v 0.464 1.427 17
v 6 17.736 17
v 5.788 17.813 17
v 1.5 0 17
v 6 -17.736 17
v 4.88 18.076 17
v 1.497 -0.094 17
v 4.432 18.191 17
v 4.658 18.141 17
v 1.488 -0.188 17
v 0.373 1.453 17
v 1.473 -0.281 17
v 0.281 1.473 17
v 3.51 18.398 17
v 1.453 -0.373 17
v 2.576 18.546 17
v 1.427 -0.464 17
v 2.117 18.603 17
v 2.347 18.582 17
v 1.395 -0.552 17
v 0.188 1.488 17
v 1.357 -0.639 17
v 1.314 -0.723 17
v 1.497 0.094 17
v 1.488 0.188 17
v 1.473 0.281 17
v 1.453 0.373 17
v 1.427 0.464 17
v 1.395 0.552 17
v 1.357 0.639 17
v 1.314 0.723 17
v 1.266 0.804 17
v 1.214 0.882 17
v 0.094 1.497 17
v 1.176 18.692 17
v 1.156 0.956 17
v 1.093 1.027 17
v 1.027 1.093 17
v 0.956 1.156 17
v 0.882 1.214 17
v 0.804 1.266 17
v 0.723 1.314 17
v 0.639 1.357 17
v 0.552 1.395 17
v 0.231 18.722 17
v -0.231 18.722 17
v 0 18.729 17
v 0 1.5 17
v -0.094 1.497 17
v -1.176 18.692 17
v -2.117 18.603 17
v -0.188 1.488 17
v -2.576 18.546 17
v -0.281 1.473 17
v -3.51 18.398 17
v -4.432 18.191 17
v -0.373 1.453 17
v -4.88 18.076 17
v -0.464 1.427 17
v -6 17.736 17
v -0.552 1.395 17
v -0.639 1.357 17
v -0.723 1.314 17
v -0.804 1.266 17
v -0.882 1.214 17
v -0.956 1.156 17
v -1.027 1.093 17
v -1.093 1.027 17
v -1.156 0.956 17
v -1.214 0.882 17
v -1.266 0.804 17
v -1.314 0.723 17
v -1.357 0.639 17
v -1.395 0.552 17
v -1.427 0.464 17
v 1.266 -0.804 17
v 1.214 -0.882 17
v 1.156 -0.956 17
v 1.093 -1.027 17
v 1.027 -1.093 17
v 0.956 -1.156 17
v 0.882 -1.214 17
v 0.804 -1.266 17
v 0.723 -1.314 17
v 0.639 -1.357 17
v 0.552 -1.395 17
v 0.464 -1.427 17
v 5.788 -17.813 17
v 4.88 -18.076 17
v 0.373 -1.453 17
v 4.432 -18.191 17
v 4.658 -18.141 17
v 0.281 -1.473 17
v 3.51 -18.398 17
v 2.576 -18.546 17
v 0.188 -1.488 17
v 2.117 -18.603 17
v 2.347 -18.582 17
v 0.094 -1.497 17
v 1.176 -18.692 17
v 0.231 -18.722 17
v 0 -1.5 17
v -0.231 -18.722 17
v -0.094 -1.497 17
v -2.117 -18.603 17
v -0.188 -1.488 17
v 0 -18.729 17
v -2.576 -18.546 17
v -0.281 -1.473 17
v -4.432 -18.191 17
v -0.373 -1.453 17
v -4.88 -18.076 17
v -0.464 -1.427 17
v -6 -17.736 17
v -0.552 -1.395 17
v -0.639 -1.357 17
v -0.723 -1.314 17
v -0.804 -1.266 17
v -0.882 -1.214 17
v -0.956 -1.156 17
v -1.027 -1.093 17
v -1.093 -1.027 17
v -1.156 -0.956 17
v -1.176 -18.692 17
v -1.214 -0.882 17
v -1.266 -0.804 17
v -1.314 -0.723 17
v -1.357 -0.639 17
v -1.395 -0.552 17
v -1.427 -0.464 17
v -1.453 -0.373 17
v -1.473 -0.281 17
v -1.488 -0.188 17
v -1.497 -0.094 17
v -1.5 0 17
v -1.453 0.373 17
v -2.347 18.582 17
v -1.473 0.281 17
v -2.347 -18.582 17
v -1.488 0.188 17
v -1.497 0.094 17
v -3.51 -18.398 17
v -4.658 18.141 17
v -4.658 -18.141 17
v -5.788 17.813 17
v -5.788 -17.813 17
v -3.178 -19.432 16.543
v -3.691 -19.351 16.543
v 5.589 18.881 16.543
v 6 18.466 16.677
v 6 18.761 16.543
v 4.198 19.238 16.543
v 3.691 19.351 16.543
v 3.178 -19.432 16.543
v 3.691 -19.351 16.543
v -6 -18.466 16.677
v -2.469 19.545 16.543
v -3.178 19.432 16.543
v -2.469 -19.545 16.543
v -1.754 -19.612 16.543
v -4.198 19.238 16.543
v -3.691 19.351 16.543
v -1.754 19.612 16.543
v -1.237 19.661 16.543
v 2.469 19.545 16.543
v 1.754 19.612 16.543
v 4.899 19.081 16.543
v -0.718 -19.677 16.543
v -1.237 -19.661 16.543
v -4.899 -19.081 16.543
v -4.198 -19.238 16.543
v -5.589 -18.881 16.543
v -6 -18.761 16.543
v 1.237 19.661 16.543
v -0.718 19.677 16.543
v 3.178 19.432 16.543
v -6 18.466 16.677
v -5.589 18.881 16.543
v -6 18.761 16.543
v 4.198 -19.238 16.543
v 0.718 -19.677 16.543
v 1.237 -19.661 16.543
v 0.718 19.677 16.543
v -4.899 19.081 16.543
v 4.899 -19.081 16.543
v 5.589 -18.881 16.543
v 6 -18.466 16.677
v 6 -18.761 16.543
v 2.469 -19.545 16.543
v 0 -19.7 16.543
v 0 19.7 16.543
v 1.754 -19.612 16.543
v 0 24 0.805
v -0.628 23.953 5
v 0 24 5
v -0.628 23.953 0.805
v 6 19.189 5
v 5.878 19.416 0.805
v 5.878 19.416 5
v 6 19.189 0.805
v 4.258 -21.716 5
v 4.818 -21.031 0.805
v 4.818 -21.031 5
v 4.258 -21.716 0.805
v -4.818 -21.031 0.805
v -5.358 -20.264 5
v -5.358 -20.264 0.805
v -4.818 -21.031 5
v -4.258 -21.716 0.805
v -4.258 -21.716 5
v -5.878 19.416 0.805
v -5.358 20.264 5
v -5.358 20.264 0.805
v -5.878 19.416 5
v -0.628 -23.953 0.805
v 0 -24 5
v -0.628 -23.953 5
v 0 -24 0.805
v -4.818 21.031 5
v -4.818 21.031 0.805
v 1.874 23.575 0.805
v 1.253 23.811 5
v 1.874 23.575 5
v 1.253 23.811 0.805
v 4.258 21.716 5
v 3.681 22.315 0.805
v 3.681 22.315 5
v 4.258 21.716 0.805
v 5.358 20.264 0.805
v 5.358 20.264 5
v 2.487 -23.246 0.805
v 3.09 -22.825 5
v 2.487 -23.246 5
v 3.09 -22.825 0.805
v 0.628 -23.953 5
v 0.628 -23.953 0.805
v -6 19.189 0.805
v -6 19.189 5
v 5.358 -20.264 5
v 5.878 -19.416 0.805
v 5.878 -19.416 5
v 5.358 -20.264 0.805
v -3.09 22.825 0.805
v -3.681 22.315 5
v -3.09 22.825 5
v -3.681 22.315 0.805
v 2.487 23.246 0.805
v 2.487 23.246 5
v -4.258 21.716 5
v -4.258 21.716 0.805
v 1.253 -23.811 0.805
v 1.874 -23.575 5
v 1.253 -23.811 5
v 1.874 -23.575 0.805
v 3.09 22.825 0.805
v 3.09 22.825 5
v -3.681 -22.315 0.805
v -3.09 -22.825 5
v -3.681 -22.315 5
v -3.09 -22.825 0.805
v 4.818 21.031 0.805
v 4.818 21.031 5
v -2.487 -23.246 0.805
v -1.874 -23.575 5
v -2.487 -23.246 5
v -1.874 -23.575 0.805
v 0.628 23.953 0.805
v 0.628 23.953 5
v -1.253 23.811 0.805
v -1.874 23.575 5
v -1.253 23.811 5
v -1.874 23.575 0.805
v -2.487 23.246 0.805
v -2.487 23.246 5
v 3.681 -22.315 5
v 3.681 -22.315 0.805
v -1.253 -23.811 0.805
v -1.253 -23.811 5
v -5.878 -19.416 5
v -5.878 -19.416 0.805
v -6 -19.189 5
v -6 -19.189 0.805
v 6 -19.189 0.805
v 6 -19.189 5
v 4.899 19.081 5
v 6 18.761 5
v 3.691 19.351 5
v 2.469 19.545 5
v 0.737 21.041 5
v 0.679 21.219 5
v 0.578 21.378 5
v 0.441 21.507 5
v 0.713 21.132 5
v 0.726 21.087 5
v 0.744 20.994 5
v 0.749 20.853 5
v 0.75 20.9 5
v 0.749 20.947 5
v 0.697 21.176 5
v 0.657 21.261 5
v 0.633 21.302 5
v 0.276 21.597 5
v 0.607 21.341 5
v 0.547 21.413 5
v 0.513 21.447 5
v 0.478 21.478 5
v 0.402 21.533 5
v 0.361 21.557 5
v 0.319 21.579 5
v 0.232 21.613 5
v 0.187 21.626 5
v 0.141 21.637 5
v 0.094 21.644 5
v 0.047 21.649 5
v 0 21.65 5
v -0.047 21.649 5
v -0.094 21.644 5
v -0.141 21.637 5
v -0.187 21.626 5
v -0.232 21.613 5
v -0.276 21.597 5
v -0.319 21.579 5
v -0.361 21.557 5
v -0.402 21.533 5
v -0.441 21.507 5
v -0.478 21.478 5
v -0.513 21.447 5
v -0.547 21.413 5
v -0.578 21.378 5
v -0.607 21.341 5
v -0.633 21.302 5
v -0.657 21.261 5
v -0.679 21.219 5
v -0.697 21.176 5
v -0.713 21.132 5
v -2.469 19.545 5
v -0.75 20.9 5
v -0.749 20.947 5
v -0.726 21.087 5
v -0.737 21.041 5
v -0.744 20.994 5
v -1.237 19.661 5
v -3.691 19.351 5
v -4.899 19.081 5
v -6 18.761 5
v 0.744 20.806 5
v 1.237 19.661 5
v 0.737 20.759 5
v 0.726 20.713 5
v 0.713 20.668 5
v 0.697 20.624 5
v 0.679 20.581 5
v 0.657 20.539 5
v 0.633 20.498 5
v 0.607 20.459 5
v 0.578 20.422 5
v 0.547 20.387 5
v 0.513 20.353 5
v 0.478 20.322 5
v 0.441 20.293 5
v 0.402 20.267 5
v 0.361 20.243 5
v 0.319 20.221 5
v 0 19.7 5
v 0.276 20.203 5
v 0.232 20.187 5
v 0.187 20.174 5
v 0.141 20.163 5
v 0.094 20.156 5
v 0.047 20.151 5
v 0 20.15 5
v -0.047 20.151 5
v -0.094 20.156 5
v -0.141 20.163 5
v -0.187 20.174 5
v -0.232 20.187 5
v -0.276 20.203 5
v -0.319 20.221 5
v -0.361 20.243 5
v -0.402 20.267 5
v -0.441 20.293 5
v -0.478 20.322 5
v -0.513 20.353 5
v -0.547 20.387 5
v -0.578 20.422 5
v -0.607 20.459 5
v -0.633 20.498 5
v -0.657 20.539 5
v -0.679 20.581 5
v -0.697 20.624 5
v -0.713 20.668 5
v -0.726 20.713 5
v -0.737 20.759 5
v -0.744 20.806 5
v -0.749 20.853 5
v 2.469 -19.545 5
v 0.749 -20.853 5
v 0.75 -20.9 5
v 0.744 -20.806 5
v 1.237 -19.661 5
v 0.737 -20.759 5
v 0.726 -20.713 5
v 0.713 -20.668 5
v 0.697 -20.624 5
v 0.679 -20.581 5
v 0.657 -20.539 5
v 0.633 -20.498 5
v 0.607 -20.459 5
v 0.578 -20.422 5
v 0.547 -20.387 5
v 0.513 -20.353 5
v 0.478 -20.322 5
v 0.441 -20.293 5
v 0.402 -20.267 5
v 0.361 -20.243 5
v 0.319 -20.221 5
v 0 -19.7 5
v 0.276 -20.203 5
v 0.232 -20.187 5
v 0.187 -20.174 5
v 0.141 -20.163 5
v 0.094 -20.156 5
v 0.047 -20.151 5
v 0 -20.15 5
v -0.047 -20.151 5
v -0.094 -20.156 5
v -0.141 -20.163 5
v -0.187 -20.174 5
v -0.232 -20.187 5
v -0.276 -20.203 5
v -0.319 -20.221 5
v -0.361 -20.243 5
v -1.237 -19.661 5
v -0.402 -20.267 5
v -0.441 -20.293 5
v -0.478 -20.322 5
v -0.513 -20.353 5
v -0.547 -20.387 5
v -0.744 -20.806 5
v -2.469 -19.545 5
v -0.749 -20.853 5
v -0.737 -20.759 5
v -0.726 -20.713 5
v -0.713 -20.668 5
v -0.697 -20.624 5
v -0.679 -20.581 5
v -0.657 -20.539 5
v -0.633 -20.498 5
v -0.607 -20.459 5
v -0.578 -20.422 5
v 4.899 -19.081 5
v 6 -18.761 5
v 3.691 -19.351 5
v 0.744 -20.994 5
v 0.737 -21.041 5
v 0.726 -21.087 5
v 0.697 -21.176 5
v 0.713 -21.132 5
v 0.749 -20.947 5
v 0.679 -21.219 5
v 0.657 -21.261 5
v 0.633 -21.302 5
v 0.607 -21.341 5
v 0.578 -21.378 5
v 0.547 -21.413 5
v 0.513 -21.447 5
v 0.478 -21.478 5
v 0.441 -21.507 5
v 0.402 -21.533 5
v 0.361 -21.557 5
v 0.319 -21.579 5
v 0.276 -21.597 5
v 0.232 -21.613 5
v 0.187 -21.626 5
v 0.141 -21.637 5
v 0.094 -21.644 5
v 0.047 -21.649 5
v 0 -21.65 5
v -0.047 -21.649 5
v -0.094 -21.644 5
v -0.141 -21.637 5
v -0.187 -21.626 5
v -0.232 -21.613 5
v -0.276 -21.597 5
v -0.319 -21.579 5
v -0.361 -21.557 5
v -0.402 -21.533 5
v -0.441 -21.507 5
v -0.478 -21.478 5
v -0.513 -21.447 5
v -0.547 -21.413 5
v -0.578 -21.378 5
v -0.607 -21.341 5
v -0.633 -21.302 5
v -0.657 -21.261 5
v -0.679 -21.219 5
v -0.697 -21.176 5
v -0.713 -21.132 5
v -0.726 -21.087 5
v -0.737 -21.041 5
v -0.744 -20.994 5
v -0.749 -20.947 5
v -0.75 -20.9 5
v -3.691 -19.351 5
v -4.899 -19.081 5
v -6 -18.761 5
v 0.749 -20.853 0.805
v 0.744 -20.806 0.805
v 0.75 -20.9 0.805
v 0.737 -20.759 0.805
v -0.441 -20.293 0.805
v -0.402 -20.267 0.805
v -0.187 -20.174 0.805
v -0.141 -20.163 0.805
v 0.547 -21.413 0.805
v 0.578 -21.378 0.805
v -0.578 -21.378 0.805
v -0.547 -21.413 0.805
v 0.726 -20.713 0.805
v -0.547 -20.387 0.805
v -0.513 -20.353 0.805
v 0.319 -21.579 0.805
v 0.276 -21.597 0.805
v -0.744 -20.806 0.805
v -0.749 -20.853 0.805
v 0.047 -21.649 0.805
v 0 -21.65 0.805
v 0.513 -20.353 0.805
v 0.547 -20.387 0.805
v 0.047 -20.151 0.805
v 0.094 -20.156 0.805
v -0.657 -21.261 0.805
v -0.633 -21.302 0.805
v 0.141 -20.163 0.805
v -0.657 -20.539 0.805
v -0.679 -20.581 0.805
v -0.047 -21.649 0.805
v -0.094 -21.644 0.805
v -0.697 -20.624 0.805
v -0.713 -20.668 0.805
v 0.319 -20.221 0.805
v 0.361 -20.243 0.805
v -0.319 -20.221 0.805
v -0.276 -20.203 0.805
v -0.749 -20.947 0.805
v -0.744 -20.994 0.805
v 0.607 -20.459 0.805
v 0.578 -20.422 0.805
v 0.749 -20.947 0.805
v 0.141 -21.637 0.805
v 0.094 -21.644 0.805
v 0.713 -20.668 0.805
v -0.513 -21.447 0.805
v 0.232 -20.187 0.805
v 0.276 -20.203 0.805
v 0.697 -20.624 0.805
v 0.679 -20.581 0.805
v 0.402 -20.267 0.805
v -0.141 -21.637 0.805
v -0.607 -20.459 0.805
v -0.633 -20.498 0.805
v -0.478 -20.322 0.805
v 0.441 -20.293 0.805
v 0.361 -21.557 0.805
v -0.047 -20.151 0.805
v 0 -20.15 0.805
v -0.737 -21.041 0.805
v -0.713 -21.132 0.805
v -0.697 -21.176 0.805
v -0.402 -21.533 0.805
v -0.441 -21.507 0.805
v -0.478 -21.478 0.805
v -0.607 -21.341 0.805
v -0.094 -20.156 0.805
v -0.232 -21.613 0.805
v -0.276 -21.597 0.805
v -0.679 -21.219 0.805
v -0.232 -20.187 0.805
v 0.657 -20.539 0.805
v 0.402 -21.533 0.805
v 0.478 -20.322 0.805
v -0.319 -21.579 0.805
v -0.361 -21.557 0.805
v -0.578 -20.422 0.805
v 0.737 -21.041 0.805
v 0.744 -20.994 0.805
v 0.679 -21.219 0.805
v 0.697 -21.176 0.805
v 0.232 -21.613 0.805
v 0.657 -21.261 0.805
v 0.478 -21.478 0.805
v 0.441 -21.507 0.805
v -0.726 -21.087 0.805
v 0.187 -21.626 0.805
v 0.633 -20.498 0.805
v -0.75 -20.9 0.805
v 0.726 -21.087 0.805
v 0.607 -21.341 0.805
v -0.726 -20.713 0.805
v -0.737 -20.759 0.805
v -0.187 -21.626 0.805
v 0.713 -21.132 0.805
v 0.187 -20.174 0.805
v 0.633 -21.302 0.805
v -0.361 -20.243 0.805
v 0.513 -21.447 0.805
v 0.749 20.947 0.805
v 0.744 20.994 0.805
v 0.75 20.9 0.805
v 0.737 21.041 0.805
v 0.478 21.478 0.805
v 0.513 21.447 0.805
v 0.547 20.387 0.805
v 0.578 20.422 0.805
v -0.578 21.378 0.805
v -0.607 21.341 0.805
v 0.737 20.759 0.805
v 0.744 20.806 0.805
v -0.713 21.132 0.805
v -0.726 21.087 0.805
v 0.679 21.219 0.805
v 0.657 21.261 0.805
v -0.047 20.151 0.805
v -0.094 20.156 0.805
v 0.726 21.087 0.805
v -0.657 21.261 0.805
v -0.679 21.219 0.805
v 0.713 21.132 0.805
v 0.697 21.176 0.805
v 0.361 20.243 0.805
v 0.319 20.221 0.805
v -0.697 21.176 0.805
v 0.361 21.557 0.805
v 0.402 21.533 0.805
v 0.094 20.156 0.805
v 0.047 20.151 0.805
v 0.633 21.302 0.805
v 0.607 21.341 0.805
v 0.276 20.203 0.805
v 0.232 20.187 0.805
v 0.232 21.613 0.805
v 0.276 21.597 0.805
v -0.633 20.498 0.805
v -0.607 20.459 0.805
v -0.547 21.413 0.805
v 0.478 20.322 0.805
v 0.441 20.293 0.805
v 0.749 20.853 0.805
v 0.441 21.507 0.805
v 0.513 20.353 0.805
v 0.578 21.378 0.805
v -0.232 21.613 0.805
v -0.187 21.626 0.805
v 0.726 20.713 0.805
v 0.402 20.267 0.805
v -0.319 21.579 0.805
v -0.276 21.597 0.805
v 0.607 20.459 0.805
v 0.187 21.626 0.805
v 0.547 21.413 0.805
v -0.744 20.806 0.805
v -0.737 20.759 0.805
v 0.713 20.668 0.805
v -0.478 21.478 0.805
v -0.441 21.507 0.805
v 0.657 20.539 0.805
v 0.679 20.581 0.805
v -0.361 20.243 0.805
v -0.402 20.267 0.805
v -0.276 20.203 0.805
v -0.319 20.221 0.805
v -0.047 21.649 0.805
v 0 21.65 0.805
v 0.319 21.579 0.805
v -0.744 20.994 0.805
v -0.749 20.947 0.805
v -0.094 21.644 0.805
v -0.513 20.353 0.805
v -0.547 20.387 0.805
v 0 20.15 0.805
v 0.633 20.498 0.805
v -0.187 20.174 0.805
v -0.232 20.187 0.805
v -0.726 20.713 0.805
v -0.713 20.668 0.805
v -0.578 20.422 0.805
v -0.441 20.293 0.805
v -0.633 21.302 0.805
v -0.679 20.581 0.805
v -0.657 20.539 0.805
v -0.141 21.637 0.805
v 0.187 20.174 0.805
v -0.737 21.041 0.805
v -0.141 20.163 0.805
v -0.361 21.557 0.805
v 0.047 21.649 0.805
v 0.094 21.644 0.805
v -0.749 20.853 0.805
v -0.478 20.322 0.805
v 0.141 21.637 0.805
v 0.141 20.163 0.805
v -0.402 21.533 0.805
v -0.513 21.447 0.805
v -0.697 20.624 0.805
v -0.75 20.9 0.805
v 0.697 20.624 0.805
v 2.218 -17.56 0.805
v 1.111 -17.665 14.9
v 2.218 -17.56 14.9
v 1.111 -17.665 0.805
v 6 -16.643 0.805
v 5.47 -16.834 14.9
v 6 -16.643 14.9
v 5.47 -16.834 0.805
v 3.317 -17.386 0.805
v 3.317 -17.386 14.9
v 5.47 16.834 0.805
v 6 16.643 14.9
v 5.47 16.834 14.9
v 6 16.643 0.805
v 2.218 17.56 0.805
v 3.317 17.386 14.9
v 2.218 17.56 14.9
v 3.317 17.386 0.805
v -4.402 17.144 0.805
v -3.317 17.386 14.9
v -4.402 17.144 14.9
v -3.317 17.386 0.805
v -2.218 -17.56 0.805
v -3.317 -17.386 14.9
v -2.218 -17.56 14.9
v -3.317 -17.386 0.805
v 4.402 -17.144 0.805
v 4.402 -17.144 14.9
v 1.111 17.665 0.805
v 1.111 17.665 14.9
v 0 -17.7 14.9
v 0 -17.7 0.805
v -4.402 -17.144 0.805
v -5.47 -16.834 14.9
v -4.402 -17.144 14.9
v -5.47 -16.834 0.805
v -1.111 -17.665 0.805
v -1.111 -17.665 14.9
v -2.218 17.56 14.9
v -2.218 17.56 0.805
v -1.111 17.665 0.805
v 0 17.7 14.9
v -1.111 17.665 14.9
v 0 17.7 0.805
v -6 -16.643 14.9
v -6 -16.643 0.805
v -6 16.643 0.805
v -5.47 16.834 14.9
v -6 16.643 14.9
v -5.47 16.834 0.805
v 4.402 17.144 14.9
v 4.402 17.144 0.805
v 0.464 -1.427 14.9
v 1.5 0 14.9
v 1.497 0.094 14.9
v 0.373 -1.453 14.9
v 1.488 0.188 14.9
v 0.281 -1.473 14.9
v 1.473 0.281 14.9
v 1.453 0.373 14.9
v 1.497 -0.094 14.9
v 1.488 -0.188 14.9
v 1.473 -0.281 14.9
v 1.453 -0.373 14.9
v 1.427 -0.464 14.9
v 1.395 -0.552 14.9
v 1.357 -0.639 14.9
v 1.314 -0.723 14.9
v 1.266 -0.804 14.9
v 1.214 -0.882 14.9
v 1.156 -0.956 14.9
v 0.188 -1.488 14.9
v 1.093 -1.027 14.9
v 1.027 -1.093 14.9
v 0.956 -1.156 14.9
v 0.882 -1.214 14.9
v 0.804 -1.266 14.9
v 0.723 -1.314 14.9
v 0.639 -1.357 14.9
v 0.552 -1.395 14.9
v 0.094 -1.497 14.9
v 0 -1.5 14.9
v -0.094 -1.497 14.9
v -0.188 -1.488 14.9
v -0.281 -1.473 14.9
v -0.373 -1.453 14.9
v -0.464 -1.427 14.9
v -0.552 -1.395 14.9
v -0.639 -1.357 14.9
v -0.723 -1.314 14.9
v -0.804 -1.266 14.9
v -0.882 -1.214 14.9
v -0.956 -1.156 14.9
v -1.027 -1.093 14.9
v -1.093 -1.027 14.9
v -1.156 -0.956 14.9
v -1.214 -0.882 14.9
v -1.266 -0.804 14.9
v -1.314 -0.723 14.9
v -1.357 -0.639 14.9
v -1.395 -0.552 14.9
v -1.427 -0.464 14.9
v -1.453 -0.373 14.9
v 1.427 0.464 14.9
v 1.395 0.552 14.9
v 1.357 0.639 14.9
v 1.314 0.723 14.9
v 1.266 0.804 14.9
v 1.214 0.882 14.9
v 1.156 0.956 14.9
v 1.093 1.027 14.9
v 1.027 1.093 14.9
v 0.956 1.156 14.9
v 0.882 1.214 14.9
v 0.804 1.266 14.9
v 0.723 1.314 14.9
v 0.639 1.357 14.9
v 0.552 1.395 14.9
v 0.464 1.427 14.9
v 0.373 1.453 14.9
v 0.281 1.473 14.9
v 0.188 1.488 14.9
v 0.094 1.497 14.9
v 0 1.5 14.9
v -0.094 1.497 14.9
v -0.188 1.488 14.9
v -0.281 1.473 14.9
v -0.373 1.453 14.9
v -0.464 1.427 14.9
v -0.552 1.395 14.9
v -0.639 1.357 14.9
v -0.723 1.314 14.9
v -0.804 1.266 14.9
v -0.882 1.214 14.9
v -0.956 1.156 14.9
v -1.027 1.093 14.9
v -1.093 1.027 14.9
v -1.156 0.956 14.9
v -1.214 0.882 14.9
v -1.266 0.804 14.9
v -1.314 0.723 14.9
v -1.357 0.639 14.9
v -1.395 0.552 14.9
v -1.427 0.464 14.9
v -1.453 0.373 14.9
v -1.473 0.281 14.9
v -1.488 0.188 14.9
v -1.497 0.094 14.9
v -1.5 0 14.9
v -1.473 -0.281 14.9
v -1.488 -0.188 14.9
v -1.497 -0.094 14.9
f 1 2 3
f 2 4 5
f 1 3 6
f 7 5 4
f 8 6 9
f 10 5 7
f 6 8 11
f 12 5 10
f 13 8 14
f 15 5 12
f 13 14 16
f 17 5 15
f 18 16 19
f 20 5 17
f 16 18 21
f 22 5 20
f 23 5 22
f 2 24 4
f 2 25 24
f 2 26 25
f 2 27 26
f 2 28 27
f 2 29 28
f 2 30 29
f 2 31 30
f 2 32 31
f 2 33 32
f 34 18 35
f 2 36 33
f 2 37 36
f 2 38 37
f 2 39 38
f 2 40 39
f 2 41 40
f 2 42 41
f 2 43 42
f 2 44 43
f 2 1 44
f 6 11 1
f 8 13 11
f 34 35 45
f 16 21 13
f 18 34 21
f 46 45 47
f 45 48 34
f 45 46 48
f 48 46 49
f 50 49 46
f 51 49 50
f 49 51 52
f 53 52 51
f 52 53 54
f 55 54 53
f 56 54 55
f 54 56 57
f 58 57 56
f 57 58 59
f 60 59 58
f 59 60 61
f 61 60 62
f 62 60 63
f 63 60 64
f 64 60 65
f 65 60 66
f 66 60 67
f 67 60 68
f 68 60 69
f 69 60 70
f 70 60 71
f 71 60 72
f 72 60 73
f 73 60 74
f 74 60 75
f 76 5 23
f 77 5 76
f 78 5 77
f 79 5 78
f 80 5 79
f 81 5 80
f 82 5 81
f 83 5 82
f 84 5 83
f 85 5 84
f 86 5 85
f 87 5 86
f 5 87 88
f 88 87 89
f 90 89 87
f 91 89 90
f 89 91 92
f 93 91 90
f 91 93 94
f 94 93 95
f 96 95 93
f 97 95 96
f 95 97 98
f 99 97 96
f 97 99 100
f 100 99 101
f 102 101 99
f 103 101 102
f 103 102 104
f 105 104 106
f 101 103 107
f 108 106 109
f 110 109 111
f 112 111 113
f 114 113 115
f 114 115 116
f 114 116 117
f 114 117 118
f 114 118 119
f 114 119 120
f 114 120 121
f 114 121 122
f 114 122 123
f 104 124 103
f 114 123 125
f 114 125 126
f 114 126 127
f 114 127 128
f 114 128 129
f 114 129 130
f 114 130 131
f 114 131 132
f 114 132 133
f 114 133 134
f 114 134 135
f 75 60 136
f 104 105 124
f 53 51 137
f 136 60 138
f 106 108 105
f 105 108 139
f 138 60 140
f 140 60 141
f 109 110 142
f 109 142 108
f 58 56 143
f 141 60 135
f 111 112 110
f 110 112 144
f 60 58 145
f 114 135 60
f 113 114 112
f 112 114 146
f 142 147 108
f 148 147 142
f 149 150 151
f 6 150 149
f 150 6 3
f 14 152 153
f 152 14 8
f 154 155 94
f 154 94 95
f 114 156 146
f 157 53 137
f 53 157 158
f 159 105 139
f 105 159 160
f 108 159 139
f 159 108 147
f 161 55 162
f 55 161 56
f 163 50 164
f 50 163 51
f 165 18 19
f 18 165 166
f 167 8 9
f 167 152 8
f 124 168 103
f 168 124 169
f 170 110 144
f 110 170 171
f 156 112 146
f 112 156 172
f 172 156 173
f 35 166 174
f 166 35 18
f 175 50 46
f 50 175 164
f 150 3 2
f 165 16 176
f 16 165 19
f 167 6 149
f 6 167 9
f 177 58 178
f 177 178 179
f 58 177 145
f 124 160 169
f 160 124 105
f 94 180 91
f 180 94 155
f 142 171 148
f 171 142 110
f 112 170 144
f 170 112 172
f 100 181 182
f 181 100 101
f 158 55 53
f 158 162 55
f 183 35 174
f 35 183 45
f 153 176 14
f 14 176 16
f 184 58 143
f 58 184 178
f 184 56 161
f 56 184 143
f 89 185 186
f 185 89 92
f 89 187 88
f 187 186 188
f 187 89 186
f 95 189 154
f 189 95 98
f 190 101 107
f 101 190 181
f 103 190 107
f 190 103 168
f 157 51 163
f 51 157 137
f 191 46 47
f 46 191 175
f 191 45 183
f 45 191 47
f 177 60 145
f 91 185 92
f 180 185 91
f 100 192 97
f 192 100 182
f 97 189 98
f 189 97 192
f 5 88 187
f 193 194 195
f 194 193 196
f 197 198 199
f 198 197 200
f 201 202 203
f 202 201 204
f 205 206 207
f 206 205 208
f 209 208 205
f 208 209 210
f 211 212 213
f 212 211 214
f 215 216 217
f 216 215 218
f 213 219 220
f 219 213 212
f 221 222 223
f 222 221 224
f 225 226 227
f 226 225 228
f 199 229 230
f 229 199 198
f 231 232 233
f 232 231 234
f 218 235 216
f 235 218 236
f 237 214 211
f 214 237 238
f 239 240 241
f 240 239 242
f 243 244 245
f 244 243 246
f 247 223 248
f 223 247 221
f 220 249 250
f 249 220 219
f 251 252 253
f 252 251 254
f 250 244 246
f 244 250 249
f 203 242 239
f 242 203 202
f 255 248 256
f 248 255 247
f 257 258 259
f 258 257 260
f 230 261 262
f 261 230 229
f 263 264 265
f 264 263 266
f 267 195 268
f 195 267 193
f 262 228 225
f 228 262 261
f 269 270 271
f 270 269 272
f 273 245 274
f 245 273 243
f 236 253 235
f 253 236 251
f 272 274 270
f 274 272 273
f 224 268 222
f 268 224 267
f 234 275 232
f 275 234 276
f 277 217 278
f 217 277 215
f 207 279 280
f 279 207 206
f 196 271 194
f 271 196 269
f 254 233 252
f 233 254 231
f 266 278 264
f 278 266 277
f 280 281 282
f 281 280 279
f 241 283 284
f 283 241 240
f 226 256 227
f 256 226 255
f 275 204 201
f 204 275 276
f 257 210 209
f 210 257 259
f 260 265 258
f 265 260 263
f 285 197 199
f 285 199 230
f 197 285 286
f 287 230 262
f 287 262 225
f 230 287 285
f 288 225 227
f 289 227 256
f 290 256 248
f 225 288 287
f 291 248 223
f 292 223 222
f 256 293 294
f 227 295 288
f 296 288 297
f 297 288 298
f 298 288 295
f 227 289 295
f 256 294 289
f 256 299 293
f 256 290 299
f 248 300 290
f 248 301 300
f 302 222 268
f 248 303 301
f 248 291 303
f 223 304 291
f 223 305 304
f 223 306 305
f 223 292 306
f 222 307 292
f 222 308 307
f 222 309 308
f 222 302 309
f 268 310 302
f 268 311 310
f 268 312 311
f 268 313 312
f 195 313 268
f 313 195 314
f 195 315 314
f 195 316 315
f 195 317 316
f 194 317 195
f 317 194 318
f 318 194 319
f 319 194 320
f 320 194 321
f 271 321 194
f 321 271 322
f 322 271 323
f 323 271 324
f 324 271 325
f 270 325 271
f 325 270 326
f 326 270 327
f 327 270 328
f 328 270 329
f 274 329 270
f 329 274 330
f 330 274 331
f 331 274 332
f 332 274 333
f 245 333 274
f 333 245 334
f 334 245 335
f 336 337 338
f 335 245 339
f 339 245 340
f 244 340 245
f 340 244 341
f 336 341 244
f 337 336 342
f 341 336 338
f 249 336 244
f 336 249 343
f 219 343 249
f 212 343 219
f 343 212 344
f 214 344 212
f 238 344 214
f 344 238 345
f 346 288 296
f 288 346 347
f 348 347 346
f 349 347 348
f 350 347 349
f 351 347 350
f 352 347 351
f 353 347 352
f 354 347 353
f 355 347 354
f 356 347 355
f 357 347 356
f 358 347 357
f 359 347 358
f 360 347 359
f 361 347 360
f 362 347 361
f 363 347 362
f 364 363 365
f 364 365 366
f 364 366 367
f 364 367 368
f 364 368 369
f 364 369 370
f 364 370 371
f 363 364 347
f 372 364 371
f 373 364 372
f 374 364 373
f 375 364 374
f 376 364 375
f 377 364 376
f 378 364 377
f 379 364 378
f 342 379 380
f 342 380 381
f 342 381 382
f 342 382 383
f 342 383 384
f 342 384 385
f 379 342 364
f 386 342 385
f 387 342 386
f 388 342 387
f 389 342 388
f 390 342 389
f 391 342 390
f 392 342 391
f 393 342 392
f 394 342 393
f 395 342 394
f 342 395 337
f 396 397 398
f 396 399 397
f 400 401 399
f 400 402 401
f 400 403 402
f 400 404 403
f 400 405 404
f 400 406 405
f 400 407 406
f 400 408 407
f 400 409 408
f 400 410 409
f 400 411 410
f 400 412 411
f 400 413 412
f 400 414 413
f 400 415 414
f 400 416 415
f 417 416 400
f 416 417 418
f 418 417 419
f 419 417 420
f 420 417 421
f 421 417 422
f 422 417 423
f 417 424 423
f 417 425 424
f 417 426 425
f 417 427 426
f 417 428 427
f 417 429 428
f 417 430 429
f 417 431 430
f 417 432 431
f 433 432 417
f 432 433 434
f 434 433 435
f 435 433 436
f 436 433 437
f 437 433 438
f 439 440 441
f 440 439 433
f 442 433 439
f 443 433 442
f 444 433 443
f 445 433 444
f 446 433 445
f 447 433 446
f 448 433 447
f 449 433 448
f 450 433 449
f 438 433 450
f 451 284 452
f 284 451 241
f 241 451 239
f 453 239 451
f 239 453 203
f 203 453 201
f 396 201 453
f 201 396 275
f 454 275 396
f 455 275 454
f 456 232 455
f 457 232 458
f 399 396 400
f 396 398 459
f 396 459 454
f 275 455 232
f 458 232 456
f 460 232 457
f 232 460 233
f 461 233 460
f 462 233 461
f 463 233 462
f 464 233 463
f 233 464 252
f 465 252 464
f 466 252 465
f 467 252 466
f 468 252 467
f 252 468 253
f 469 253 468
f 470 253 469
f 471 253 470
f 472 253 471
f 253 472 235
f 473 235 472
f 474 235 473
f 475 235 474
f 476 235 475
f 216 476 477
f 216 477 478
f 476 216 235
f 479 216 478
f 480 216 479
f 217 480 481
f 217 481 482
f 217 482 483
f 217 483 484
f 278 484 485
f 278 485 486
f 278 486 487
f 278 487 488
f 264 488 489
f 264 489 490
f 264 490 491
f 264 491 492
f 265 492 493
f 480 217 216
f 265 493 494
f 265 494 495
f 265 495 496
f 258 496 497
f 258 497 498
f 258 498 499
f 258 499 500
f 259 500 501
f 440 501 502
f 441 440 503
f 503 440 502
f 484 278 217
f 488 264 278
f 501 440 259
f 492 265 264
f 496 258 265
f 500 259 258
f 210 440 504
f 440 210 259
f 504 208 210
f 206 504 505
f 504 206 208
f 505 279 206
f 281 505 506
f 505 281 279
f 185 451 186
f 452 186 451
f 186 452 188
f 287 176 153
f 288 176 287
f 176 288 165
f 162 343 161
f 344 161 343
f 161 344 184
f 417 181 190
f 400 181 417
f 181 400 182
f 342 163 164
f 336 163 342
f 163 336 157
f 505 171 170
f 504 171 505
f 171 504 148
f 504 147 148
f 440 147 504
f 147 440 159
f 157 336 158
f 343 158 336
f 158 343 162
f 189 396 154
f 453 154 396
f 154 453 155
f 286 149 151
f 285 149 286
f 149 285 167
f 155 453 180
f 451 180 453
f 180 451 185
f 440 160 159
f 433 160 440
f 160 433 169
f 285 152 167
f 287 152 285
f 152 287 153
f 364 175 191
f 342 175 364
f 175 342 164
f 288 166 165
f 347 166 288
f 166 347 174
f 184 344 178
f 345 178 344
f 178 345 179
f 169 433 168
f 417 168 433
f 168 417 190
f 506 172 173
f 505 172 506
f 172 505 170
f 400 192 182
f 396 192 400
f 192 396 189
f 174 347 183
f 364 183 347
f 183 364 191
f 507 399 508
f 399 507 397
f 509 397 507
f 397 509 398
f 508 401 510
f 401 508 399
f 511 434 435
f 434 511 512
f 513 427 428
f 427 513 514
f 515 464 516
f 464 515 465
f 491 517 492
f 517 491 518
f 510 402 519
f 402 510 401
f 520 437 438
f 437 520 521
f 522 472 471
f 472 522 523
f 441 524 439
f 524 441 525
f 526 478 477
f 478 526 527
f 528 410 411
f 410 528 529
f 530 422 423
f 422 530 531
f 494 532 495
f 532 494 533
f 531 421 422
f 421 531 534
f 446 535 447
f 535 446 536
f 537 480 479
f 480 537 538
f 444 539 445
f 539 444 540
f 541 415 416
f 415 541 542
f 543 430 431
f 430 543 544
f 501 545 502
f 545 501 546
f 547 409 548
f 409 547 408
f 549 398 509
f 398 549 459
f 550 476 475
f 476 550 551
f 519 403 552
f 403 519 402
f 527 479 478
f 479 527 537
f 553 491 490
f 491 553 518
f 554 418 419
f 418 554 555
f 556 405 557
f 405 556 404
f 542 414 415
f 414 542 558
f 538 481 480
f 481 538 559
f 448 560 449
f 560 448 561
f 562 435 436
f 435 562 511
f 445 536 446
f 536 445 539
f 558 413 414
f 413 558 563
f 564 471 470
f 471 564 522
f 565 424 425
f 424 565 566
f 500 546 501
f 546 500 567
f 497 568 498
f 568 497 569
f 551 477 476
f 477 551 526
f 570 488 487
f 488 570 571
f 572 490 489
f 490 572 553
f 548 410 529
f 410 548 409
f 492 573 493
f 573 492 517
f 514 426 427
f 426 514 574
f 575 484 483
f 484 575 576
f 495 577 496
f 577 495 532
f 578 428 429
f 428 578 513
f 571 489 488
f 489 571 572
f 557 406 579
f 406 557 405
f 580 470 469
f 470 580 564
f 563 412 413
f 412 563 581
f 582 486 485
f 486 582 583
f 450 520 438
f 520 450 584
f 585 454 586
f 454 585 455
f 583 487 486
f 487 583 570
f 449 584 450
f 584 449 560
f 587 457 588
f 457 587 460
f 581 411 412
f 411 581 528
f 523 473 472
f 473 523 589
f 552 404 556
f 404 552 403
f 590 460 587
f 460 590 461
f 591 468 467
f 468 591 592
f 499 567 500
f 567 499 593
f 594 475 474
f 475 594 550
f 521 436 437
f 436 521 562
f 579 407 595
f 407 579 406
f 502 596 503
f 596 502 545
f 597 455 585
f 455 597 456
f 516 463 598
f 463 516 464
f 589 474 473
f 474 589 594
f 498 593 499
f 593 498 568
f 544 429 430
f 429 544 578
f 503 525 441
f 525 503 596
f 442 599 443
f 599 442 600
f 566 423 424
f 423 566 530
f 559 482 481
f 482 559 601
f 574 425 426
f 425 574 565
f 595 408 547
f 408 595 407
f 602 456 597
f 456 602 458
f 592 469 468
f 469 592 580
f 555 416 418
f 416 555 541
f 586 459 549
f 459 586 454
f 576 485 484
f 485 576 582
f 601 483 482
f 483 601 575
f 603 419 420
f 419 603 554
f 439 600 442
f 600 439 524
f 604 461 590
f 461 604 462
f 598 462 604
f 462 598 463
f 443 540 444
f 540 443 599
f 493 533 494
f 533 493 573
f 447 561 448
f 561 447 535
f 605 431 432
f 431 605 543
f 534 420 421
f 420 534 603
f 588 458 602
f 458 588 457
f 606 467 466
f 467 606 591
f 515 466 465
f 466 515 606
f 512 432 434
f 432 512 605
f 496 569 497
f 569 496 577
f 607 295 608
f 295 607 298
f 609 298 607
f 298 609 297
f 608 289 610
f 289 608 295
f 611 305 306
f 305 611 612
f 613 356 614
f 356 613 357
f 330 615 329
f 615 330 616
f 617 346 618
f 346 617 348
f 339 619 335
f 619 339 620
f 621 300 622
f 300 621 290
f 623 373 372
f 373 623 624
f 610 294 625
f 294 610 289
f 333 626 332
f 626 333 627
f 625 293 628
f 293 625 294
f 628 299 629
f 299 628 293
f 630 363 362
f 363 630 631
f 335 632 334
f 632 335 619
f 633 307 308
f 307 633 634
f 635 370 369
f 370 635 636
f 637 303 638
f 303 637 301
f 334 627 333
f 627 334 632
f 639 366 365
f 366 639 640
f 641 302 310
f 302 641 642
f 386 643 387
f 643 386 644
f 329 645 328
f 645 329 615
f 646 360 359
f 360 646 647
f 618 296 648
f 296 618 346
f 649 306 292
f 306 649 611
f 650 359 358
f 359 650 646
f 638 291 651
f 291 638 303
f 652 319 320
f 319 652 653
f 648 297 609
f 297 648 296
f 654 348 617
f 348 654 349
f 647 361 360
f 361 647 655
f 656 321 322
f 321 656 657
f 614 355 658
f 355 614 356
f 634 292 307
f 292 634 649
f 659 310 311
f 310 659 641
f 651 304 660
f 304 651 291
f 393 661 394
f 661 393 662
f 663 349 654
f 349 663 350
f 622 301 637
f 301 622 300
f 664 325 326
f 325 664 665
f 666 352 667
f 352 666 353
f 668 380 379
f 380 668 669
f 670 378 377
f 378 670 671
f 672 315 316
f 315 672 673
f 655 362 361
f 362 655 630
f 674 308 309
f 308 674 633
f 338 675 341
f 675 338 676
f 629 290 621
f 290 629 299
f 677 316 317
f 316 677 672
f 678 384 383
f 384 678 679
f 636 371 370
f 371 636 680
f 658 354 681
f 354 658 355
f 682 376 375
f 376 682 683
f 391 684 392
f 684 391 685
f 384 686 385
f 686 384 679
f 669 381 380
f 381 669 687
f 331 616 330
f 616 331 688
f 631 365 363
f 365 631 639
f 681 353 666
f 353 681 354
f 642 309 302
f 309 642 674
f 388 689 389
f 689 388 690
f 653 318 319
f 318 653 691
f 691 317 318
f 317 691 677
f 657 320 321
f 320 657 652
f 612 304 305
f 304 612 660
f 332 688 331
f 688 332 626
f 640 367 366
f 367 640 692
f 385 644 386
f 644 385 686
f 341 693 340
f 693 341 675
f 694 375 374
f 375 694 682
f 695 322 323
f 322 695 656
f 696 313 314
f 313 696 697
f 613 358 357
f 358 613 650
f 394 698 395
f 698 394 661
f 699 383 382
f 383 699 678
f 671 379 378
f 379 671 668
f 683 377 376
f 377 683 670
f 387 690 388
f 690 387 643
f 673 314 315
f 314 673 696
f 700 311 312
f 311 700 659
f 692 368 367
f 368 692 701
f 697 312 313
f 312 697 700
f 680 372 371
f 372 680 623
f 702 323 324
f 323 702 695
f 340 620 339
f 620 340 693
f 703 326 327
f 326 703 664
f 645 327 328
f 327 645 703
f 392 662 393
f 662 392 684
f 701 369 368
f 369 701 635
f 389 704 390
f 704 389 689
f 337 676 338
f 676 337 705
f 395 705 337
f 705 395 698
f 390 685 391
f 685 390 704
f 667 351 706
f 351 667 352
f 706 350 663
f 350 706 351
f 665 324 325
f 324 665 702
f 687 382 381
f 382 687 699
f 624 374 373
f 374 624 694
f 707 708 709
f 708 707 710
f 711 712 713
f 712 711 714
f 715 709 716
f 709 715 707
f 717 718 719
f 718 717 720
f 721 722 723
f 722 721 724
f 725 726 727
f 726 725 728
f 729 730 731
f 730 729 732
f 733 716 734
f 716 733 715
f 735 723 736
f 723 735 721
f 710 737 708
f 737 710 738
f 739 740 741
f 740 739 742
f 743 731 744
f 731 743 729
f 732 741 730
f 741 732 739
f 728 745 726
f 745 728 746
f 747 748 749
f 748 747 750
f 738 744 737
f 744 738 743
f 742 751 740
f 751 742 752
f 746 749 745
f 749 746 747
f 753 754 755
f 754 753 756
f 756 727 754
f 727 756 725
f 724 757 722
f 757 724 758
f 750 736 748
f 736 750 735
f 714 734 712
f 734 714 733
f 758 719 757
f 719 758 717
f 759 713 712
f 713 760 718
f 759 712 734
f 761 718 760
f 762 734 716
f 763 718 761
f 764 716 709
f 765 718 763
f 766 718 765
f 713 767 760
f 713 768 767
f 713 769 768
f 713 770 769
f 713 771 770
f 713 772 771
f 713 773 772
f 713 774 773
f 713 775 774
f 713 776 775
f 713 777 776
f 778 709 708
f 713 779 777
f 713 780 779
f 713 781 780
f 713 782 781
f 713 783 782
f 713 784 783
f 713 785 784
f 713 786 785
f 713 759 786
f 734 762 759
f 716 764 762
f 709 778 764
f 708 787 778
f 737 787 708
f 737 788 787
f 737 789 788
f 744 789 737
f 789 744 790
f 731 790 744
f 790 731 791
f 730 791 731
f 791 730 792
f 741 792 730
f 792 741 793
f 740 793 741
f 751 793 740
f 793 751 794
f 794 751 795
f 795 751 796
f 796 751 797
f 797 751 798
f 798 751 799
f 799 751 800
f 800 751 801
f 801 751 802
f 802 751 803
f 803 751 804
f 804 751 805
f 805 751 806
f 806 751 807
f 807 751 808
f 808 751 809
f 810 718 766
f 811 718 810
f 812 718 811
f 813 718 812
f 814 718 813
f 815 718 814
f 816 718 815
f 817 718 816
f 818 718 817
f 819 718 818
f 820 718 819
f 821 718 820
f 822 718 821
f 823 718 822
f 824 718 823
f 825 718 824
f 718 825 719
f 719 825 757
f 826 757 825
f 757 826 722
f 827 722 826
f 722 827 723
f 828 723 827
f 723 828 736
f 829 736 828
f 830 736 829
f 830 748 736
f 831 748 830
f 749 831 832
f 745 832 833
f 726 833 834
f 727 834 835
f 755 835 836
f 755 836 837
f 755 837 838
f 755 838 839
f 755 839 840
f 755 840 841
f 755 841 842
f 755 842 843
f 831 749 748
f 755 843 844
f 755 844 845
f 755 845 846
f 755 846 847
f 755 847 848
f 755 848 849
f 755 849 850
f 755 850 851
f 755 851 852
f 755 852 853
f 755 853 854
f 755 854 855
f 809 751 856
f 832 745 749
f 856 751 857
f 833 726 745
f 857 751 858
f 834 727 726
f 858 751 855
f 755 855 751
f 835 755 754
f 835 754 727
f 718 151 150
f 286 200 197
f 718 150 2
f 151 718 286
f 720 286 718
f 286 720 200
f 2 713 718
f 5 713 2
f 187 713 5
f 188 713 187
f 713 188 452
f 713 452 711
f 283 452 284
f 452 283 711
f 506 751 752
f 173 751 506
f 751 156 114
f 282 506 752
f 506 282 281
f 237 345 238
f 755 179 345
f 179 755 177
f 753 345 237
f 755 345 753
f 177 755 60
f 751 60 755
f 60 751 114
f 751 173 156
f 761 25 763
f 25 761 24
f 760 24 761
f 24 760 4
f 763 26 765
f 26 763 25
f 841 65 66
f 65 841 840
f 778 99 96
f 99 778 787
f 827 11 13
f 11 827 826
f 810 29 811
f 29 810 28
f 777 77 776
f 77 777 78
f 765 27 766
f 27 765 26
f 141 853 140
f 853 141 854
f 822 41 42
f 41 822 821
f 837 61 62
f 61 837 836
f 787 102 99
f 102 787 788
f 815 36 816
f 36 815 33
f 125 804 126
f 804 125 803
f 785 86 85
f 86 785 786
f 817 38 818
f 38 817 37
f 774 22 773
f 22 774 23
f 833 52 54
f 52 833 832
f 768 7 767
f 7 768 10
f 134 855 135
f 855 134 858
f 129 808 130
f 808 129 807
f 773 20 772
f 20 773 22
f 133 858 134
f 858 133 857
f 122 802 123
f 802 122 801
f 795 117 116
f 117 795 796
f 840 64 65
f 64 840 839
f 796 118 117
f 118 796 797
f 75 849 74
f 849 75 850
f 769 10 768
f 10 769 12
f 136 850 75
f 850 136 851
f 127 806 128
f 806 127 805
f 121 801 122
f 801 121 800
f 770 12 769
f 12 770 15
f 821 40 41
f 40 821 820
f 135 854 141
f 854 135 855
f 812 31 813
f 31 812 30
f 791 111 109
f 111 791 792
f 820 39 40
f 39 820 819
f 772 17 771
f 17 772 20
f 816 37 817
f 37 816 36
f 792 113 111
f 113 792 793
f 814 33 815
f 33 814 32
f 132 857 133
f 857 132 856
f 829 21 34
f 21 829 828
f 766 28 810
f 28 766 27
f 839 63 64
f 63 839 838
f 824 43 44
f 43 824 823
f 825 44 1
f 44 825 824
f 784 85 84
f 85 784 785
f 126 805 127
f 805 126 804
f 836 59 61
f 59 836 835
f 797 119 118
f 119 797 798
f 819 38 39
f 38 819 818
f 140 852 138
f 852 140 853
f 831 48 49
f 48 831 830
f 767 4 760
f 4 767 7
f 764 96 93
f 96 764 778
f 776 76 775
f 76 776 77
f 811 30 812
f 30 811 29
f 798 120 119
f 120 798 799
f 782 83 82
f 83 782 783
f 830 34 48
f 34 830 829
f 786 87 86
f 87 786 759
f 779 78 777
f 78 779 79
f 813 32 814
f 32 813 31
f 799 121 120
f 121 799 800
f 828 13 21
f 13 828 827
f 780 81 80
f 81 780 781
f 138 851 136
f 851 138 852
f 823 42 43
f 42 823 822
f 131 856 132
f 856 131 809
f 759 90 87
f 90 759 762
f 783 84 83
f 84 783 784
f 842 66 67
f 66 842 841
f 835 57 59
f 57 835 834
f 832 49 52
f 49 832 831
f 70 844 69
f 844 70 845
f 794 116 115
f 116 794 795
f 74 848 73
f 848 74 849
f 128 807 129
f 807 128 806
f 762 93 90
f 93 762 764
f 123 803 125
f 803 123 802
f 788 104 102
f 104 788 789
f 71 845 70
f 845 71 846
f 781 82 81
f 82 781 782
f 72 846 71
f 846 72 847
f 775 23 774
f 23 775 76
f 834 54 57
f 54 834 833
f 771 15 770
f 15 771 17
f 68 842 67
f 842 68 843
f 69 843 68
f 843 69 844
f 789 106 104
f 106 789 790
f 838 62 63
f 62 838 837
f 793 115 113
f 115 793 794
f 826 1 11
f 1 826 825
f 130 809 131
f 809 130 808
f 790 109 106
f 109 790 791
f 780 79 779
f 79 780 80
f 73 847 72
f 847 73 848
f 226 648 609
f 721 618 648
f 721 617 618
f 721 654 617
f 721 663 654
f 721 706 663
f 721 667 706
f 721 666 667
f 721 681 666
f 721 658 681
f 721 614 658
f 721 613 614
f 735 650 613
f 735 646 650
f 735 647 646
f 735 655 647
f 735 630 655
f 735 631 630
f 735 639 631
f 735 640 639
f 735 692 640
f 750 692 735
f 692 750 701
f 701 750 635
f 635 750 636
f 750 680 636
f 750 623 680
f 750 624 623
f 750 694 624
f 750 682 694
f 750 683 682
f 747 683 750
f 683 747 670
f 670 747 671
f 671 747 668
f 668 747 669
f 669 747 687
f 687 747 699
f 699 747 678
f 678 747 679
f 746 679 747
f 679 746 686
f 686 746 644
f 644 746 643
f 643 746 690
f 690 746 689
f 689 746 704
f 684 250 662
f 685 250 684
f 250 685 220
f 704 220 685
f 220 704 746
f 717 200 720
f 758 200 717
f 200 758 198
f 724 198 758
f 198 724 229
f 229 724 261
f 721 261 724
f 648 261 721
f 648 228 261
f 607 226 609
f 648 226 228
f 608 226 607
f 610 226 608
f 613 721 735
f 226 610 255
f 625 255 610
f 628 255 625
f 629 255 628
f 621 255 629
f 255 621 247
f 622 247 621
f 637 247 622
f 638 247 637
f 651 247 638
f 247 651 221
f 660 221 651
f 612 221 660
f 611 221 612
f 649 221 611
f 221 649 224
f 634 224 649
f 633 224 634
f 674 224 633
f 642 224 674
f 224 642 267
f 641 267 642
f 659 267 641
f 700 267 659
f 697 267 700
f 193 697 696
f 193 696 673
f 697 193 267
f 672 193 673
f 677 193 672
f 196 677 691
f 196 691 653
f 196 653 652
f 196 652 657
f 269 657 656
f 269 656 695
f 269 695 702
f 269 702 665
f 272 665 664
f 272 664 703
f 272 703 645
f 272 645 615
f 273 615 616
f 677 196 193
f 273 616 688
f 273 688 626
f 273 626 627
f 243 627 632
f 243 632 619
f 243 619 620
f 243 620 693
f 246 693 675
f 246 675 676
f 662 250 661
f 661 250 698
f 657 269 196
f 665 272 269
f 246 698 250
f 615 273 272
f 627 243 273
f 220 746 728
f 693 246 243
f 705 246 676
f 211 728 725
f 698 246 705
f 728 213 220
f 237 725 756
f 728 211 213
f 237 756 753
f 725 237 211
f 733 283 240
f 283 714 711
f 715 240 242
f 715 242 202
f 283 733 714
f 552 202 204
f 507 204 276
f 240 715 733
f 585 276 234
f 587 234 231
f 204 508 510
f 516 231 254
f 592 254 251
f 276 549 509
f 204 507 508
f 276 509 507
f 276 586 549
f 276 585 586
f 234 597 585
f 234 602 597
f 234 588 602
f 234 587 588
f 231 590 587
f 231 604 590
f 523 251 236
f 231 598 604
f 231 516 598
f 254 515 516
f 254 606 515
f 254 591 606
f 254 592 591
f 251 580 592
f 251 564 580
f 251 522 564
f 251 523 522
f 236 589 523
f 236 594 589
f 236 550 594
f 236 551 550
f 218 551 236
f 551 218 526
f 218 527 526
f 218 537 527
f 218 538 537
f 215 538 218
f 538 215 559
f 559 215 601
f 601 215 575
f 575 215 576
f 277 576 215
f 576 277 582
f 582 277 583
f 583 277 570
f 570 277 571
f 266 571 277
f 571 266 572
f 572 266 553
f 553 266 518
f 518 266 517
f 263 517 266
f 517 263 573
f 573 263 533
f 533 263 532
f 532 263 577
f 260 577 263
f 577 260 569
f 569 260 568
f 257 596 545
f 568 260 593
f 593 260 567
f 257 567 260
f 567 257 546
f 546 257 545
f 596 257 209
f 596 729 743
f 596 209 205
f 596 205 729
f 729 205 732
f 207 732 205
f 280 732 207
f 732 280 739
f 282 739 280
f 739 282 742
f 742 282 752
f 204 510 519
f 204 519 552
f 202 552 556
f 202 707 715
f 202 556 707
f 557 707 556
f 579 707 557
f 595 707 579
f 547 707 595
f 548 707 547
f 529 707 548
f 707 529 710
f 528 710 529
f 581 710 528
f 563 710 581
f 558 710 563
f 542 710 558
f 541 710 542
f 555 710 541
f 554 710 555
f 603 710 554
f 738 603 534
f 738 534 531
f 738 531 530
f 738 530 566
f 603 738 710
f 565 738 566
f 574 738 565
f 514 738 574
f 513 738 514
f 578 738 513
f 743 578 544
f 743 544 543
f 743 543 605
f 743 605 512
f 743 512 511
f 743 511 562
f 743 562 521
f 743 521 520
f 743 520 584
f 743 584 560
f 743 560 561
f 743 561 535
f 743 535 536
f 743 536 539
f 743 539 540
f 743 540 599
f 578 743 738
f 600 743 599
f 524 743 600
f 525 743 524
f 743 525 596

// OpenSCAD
$fn=100;
module motor_mount(){
    motor_radius = 35;
    motor_height = 15;
    flange_height = 0.8;
    attach_hole_dimention = 41.8;
    motormax_radius = 48;
    tickness = 2;
    difference(){
        intersection(){
            cylinder(r=motormax_radius/2,h=motor_height+tickness);
            translate([0,0,-25])
            sphere(r=46);
            scale([1,2.4,1])
            cylinder(r=20/2,h=100);
        }
        translate([0,0,5])
        difference(){
            cylinder(r=motormax_radius/2+1,h=motor_height+2);
            cylinder(r=(motor_radius+0.4)/2+tickness,h=motor_height+2);
        }
        translate([0,0,-0.1])
        cylinder(r=(motor_radius+0.4)/2,h=motor_height);
        translate([50+6,0,0])
        cube([100,100,100],center=true);
        translate([-50-6,0,0])
        cube([100,100,100],center=true);
        cylinder(r=3/2,h=100,center=true);
        
        for(i=[-1,1]){
            translate([0,i*attach_hole_dimention/2,-0.1])
            cylinder(r=1.5/2,h=6);
        }
        translate([0,0,flange_height/2])
        cylinder(r=100,h=flange_height+0.01,center=true);
    }
}

motor_mount();
